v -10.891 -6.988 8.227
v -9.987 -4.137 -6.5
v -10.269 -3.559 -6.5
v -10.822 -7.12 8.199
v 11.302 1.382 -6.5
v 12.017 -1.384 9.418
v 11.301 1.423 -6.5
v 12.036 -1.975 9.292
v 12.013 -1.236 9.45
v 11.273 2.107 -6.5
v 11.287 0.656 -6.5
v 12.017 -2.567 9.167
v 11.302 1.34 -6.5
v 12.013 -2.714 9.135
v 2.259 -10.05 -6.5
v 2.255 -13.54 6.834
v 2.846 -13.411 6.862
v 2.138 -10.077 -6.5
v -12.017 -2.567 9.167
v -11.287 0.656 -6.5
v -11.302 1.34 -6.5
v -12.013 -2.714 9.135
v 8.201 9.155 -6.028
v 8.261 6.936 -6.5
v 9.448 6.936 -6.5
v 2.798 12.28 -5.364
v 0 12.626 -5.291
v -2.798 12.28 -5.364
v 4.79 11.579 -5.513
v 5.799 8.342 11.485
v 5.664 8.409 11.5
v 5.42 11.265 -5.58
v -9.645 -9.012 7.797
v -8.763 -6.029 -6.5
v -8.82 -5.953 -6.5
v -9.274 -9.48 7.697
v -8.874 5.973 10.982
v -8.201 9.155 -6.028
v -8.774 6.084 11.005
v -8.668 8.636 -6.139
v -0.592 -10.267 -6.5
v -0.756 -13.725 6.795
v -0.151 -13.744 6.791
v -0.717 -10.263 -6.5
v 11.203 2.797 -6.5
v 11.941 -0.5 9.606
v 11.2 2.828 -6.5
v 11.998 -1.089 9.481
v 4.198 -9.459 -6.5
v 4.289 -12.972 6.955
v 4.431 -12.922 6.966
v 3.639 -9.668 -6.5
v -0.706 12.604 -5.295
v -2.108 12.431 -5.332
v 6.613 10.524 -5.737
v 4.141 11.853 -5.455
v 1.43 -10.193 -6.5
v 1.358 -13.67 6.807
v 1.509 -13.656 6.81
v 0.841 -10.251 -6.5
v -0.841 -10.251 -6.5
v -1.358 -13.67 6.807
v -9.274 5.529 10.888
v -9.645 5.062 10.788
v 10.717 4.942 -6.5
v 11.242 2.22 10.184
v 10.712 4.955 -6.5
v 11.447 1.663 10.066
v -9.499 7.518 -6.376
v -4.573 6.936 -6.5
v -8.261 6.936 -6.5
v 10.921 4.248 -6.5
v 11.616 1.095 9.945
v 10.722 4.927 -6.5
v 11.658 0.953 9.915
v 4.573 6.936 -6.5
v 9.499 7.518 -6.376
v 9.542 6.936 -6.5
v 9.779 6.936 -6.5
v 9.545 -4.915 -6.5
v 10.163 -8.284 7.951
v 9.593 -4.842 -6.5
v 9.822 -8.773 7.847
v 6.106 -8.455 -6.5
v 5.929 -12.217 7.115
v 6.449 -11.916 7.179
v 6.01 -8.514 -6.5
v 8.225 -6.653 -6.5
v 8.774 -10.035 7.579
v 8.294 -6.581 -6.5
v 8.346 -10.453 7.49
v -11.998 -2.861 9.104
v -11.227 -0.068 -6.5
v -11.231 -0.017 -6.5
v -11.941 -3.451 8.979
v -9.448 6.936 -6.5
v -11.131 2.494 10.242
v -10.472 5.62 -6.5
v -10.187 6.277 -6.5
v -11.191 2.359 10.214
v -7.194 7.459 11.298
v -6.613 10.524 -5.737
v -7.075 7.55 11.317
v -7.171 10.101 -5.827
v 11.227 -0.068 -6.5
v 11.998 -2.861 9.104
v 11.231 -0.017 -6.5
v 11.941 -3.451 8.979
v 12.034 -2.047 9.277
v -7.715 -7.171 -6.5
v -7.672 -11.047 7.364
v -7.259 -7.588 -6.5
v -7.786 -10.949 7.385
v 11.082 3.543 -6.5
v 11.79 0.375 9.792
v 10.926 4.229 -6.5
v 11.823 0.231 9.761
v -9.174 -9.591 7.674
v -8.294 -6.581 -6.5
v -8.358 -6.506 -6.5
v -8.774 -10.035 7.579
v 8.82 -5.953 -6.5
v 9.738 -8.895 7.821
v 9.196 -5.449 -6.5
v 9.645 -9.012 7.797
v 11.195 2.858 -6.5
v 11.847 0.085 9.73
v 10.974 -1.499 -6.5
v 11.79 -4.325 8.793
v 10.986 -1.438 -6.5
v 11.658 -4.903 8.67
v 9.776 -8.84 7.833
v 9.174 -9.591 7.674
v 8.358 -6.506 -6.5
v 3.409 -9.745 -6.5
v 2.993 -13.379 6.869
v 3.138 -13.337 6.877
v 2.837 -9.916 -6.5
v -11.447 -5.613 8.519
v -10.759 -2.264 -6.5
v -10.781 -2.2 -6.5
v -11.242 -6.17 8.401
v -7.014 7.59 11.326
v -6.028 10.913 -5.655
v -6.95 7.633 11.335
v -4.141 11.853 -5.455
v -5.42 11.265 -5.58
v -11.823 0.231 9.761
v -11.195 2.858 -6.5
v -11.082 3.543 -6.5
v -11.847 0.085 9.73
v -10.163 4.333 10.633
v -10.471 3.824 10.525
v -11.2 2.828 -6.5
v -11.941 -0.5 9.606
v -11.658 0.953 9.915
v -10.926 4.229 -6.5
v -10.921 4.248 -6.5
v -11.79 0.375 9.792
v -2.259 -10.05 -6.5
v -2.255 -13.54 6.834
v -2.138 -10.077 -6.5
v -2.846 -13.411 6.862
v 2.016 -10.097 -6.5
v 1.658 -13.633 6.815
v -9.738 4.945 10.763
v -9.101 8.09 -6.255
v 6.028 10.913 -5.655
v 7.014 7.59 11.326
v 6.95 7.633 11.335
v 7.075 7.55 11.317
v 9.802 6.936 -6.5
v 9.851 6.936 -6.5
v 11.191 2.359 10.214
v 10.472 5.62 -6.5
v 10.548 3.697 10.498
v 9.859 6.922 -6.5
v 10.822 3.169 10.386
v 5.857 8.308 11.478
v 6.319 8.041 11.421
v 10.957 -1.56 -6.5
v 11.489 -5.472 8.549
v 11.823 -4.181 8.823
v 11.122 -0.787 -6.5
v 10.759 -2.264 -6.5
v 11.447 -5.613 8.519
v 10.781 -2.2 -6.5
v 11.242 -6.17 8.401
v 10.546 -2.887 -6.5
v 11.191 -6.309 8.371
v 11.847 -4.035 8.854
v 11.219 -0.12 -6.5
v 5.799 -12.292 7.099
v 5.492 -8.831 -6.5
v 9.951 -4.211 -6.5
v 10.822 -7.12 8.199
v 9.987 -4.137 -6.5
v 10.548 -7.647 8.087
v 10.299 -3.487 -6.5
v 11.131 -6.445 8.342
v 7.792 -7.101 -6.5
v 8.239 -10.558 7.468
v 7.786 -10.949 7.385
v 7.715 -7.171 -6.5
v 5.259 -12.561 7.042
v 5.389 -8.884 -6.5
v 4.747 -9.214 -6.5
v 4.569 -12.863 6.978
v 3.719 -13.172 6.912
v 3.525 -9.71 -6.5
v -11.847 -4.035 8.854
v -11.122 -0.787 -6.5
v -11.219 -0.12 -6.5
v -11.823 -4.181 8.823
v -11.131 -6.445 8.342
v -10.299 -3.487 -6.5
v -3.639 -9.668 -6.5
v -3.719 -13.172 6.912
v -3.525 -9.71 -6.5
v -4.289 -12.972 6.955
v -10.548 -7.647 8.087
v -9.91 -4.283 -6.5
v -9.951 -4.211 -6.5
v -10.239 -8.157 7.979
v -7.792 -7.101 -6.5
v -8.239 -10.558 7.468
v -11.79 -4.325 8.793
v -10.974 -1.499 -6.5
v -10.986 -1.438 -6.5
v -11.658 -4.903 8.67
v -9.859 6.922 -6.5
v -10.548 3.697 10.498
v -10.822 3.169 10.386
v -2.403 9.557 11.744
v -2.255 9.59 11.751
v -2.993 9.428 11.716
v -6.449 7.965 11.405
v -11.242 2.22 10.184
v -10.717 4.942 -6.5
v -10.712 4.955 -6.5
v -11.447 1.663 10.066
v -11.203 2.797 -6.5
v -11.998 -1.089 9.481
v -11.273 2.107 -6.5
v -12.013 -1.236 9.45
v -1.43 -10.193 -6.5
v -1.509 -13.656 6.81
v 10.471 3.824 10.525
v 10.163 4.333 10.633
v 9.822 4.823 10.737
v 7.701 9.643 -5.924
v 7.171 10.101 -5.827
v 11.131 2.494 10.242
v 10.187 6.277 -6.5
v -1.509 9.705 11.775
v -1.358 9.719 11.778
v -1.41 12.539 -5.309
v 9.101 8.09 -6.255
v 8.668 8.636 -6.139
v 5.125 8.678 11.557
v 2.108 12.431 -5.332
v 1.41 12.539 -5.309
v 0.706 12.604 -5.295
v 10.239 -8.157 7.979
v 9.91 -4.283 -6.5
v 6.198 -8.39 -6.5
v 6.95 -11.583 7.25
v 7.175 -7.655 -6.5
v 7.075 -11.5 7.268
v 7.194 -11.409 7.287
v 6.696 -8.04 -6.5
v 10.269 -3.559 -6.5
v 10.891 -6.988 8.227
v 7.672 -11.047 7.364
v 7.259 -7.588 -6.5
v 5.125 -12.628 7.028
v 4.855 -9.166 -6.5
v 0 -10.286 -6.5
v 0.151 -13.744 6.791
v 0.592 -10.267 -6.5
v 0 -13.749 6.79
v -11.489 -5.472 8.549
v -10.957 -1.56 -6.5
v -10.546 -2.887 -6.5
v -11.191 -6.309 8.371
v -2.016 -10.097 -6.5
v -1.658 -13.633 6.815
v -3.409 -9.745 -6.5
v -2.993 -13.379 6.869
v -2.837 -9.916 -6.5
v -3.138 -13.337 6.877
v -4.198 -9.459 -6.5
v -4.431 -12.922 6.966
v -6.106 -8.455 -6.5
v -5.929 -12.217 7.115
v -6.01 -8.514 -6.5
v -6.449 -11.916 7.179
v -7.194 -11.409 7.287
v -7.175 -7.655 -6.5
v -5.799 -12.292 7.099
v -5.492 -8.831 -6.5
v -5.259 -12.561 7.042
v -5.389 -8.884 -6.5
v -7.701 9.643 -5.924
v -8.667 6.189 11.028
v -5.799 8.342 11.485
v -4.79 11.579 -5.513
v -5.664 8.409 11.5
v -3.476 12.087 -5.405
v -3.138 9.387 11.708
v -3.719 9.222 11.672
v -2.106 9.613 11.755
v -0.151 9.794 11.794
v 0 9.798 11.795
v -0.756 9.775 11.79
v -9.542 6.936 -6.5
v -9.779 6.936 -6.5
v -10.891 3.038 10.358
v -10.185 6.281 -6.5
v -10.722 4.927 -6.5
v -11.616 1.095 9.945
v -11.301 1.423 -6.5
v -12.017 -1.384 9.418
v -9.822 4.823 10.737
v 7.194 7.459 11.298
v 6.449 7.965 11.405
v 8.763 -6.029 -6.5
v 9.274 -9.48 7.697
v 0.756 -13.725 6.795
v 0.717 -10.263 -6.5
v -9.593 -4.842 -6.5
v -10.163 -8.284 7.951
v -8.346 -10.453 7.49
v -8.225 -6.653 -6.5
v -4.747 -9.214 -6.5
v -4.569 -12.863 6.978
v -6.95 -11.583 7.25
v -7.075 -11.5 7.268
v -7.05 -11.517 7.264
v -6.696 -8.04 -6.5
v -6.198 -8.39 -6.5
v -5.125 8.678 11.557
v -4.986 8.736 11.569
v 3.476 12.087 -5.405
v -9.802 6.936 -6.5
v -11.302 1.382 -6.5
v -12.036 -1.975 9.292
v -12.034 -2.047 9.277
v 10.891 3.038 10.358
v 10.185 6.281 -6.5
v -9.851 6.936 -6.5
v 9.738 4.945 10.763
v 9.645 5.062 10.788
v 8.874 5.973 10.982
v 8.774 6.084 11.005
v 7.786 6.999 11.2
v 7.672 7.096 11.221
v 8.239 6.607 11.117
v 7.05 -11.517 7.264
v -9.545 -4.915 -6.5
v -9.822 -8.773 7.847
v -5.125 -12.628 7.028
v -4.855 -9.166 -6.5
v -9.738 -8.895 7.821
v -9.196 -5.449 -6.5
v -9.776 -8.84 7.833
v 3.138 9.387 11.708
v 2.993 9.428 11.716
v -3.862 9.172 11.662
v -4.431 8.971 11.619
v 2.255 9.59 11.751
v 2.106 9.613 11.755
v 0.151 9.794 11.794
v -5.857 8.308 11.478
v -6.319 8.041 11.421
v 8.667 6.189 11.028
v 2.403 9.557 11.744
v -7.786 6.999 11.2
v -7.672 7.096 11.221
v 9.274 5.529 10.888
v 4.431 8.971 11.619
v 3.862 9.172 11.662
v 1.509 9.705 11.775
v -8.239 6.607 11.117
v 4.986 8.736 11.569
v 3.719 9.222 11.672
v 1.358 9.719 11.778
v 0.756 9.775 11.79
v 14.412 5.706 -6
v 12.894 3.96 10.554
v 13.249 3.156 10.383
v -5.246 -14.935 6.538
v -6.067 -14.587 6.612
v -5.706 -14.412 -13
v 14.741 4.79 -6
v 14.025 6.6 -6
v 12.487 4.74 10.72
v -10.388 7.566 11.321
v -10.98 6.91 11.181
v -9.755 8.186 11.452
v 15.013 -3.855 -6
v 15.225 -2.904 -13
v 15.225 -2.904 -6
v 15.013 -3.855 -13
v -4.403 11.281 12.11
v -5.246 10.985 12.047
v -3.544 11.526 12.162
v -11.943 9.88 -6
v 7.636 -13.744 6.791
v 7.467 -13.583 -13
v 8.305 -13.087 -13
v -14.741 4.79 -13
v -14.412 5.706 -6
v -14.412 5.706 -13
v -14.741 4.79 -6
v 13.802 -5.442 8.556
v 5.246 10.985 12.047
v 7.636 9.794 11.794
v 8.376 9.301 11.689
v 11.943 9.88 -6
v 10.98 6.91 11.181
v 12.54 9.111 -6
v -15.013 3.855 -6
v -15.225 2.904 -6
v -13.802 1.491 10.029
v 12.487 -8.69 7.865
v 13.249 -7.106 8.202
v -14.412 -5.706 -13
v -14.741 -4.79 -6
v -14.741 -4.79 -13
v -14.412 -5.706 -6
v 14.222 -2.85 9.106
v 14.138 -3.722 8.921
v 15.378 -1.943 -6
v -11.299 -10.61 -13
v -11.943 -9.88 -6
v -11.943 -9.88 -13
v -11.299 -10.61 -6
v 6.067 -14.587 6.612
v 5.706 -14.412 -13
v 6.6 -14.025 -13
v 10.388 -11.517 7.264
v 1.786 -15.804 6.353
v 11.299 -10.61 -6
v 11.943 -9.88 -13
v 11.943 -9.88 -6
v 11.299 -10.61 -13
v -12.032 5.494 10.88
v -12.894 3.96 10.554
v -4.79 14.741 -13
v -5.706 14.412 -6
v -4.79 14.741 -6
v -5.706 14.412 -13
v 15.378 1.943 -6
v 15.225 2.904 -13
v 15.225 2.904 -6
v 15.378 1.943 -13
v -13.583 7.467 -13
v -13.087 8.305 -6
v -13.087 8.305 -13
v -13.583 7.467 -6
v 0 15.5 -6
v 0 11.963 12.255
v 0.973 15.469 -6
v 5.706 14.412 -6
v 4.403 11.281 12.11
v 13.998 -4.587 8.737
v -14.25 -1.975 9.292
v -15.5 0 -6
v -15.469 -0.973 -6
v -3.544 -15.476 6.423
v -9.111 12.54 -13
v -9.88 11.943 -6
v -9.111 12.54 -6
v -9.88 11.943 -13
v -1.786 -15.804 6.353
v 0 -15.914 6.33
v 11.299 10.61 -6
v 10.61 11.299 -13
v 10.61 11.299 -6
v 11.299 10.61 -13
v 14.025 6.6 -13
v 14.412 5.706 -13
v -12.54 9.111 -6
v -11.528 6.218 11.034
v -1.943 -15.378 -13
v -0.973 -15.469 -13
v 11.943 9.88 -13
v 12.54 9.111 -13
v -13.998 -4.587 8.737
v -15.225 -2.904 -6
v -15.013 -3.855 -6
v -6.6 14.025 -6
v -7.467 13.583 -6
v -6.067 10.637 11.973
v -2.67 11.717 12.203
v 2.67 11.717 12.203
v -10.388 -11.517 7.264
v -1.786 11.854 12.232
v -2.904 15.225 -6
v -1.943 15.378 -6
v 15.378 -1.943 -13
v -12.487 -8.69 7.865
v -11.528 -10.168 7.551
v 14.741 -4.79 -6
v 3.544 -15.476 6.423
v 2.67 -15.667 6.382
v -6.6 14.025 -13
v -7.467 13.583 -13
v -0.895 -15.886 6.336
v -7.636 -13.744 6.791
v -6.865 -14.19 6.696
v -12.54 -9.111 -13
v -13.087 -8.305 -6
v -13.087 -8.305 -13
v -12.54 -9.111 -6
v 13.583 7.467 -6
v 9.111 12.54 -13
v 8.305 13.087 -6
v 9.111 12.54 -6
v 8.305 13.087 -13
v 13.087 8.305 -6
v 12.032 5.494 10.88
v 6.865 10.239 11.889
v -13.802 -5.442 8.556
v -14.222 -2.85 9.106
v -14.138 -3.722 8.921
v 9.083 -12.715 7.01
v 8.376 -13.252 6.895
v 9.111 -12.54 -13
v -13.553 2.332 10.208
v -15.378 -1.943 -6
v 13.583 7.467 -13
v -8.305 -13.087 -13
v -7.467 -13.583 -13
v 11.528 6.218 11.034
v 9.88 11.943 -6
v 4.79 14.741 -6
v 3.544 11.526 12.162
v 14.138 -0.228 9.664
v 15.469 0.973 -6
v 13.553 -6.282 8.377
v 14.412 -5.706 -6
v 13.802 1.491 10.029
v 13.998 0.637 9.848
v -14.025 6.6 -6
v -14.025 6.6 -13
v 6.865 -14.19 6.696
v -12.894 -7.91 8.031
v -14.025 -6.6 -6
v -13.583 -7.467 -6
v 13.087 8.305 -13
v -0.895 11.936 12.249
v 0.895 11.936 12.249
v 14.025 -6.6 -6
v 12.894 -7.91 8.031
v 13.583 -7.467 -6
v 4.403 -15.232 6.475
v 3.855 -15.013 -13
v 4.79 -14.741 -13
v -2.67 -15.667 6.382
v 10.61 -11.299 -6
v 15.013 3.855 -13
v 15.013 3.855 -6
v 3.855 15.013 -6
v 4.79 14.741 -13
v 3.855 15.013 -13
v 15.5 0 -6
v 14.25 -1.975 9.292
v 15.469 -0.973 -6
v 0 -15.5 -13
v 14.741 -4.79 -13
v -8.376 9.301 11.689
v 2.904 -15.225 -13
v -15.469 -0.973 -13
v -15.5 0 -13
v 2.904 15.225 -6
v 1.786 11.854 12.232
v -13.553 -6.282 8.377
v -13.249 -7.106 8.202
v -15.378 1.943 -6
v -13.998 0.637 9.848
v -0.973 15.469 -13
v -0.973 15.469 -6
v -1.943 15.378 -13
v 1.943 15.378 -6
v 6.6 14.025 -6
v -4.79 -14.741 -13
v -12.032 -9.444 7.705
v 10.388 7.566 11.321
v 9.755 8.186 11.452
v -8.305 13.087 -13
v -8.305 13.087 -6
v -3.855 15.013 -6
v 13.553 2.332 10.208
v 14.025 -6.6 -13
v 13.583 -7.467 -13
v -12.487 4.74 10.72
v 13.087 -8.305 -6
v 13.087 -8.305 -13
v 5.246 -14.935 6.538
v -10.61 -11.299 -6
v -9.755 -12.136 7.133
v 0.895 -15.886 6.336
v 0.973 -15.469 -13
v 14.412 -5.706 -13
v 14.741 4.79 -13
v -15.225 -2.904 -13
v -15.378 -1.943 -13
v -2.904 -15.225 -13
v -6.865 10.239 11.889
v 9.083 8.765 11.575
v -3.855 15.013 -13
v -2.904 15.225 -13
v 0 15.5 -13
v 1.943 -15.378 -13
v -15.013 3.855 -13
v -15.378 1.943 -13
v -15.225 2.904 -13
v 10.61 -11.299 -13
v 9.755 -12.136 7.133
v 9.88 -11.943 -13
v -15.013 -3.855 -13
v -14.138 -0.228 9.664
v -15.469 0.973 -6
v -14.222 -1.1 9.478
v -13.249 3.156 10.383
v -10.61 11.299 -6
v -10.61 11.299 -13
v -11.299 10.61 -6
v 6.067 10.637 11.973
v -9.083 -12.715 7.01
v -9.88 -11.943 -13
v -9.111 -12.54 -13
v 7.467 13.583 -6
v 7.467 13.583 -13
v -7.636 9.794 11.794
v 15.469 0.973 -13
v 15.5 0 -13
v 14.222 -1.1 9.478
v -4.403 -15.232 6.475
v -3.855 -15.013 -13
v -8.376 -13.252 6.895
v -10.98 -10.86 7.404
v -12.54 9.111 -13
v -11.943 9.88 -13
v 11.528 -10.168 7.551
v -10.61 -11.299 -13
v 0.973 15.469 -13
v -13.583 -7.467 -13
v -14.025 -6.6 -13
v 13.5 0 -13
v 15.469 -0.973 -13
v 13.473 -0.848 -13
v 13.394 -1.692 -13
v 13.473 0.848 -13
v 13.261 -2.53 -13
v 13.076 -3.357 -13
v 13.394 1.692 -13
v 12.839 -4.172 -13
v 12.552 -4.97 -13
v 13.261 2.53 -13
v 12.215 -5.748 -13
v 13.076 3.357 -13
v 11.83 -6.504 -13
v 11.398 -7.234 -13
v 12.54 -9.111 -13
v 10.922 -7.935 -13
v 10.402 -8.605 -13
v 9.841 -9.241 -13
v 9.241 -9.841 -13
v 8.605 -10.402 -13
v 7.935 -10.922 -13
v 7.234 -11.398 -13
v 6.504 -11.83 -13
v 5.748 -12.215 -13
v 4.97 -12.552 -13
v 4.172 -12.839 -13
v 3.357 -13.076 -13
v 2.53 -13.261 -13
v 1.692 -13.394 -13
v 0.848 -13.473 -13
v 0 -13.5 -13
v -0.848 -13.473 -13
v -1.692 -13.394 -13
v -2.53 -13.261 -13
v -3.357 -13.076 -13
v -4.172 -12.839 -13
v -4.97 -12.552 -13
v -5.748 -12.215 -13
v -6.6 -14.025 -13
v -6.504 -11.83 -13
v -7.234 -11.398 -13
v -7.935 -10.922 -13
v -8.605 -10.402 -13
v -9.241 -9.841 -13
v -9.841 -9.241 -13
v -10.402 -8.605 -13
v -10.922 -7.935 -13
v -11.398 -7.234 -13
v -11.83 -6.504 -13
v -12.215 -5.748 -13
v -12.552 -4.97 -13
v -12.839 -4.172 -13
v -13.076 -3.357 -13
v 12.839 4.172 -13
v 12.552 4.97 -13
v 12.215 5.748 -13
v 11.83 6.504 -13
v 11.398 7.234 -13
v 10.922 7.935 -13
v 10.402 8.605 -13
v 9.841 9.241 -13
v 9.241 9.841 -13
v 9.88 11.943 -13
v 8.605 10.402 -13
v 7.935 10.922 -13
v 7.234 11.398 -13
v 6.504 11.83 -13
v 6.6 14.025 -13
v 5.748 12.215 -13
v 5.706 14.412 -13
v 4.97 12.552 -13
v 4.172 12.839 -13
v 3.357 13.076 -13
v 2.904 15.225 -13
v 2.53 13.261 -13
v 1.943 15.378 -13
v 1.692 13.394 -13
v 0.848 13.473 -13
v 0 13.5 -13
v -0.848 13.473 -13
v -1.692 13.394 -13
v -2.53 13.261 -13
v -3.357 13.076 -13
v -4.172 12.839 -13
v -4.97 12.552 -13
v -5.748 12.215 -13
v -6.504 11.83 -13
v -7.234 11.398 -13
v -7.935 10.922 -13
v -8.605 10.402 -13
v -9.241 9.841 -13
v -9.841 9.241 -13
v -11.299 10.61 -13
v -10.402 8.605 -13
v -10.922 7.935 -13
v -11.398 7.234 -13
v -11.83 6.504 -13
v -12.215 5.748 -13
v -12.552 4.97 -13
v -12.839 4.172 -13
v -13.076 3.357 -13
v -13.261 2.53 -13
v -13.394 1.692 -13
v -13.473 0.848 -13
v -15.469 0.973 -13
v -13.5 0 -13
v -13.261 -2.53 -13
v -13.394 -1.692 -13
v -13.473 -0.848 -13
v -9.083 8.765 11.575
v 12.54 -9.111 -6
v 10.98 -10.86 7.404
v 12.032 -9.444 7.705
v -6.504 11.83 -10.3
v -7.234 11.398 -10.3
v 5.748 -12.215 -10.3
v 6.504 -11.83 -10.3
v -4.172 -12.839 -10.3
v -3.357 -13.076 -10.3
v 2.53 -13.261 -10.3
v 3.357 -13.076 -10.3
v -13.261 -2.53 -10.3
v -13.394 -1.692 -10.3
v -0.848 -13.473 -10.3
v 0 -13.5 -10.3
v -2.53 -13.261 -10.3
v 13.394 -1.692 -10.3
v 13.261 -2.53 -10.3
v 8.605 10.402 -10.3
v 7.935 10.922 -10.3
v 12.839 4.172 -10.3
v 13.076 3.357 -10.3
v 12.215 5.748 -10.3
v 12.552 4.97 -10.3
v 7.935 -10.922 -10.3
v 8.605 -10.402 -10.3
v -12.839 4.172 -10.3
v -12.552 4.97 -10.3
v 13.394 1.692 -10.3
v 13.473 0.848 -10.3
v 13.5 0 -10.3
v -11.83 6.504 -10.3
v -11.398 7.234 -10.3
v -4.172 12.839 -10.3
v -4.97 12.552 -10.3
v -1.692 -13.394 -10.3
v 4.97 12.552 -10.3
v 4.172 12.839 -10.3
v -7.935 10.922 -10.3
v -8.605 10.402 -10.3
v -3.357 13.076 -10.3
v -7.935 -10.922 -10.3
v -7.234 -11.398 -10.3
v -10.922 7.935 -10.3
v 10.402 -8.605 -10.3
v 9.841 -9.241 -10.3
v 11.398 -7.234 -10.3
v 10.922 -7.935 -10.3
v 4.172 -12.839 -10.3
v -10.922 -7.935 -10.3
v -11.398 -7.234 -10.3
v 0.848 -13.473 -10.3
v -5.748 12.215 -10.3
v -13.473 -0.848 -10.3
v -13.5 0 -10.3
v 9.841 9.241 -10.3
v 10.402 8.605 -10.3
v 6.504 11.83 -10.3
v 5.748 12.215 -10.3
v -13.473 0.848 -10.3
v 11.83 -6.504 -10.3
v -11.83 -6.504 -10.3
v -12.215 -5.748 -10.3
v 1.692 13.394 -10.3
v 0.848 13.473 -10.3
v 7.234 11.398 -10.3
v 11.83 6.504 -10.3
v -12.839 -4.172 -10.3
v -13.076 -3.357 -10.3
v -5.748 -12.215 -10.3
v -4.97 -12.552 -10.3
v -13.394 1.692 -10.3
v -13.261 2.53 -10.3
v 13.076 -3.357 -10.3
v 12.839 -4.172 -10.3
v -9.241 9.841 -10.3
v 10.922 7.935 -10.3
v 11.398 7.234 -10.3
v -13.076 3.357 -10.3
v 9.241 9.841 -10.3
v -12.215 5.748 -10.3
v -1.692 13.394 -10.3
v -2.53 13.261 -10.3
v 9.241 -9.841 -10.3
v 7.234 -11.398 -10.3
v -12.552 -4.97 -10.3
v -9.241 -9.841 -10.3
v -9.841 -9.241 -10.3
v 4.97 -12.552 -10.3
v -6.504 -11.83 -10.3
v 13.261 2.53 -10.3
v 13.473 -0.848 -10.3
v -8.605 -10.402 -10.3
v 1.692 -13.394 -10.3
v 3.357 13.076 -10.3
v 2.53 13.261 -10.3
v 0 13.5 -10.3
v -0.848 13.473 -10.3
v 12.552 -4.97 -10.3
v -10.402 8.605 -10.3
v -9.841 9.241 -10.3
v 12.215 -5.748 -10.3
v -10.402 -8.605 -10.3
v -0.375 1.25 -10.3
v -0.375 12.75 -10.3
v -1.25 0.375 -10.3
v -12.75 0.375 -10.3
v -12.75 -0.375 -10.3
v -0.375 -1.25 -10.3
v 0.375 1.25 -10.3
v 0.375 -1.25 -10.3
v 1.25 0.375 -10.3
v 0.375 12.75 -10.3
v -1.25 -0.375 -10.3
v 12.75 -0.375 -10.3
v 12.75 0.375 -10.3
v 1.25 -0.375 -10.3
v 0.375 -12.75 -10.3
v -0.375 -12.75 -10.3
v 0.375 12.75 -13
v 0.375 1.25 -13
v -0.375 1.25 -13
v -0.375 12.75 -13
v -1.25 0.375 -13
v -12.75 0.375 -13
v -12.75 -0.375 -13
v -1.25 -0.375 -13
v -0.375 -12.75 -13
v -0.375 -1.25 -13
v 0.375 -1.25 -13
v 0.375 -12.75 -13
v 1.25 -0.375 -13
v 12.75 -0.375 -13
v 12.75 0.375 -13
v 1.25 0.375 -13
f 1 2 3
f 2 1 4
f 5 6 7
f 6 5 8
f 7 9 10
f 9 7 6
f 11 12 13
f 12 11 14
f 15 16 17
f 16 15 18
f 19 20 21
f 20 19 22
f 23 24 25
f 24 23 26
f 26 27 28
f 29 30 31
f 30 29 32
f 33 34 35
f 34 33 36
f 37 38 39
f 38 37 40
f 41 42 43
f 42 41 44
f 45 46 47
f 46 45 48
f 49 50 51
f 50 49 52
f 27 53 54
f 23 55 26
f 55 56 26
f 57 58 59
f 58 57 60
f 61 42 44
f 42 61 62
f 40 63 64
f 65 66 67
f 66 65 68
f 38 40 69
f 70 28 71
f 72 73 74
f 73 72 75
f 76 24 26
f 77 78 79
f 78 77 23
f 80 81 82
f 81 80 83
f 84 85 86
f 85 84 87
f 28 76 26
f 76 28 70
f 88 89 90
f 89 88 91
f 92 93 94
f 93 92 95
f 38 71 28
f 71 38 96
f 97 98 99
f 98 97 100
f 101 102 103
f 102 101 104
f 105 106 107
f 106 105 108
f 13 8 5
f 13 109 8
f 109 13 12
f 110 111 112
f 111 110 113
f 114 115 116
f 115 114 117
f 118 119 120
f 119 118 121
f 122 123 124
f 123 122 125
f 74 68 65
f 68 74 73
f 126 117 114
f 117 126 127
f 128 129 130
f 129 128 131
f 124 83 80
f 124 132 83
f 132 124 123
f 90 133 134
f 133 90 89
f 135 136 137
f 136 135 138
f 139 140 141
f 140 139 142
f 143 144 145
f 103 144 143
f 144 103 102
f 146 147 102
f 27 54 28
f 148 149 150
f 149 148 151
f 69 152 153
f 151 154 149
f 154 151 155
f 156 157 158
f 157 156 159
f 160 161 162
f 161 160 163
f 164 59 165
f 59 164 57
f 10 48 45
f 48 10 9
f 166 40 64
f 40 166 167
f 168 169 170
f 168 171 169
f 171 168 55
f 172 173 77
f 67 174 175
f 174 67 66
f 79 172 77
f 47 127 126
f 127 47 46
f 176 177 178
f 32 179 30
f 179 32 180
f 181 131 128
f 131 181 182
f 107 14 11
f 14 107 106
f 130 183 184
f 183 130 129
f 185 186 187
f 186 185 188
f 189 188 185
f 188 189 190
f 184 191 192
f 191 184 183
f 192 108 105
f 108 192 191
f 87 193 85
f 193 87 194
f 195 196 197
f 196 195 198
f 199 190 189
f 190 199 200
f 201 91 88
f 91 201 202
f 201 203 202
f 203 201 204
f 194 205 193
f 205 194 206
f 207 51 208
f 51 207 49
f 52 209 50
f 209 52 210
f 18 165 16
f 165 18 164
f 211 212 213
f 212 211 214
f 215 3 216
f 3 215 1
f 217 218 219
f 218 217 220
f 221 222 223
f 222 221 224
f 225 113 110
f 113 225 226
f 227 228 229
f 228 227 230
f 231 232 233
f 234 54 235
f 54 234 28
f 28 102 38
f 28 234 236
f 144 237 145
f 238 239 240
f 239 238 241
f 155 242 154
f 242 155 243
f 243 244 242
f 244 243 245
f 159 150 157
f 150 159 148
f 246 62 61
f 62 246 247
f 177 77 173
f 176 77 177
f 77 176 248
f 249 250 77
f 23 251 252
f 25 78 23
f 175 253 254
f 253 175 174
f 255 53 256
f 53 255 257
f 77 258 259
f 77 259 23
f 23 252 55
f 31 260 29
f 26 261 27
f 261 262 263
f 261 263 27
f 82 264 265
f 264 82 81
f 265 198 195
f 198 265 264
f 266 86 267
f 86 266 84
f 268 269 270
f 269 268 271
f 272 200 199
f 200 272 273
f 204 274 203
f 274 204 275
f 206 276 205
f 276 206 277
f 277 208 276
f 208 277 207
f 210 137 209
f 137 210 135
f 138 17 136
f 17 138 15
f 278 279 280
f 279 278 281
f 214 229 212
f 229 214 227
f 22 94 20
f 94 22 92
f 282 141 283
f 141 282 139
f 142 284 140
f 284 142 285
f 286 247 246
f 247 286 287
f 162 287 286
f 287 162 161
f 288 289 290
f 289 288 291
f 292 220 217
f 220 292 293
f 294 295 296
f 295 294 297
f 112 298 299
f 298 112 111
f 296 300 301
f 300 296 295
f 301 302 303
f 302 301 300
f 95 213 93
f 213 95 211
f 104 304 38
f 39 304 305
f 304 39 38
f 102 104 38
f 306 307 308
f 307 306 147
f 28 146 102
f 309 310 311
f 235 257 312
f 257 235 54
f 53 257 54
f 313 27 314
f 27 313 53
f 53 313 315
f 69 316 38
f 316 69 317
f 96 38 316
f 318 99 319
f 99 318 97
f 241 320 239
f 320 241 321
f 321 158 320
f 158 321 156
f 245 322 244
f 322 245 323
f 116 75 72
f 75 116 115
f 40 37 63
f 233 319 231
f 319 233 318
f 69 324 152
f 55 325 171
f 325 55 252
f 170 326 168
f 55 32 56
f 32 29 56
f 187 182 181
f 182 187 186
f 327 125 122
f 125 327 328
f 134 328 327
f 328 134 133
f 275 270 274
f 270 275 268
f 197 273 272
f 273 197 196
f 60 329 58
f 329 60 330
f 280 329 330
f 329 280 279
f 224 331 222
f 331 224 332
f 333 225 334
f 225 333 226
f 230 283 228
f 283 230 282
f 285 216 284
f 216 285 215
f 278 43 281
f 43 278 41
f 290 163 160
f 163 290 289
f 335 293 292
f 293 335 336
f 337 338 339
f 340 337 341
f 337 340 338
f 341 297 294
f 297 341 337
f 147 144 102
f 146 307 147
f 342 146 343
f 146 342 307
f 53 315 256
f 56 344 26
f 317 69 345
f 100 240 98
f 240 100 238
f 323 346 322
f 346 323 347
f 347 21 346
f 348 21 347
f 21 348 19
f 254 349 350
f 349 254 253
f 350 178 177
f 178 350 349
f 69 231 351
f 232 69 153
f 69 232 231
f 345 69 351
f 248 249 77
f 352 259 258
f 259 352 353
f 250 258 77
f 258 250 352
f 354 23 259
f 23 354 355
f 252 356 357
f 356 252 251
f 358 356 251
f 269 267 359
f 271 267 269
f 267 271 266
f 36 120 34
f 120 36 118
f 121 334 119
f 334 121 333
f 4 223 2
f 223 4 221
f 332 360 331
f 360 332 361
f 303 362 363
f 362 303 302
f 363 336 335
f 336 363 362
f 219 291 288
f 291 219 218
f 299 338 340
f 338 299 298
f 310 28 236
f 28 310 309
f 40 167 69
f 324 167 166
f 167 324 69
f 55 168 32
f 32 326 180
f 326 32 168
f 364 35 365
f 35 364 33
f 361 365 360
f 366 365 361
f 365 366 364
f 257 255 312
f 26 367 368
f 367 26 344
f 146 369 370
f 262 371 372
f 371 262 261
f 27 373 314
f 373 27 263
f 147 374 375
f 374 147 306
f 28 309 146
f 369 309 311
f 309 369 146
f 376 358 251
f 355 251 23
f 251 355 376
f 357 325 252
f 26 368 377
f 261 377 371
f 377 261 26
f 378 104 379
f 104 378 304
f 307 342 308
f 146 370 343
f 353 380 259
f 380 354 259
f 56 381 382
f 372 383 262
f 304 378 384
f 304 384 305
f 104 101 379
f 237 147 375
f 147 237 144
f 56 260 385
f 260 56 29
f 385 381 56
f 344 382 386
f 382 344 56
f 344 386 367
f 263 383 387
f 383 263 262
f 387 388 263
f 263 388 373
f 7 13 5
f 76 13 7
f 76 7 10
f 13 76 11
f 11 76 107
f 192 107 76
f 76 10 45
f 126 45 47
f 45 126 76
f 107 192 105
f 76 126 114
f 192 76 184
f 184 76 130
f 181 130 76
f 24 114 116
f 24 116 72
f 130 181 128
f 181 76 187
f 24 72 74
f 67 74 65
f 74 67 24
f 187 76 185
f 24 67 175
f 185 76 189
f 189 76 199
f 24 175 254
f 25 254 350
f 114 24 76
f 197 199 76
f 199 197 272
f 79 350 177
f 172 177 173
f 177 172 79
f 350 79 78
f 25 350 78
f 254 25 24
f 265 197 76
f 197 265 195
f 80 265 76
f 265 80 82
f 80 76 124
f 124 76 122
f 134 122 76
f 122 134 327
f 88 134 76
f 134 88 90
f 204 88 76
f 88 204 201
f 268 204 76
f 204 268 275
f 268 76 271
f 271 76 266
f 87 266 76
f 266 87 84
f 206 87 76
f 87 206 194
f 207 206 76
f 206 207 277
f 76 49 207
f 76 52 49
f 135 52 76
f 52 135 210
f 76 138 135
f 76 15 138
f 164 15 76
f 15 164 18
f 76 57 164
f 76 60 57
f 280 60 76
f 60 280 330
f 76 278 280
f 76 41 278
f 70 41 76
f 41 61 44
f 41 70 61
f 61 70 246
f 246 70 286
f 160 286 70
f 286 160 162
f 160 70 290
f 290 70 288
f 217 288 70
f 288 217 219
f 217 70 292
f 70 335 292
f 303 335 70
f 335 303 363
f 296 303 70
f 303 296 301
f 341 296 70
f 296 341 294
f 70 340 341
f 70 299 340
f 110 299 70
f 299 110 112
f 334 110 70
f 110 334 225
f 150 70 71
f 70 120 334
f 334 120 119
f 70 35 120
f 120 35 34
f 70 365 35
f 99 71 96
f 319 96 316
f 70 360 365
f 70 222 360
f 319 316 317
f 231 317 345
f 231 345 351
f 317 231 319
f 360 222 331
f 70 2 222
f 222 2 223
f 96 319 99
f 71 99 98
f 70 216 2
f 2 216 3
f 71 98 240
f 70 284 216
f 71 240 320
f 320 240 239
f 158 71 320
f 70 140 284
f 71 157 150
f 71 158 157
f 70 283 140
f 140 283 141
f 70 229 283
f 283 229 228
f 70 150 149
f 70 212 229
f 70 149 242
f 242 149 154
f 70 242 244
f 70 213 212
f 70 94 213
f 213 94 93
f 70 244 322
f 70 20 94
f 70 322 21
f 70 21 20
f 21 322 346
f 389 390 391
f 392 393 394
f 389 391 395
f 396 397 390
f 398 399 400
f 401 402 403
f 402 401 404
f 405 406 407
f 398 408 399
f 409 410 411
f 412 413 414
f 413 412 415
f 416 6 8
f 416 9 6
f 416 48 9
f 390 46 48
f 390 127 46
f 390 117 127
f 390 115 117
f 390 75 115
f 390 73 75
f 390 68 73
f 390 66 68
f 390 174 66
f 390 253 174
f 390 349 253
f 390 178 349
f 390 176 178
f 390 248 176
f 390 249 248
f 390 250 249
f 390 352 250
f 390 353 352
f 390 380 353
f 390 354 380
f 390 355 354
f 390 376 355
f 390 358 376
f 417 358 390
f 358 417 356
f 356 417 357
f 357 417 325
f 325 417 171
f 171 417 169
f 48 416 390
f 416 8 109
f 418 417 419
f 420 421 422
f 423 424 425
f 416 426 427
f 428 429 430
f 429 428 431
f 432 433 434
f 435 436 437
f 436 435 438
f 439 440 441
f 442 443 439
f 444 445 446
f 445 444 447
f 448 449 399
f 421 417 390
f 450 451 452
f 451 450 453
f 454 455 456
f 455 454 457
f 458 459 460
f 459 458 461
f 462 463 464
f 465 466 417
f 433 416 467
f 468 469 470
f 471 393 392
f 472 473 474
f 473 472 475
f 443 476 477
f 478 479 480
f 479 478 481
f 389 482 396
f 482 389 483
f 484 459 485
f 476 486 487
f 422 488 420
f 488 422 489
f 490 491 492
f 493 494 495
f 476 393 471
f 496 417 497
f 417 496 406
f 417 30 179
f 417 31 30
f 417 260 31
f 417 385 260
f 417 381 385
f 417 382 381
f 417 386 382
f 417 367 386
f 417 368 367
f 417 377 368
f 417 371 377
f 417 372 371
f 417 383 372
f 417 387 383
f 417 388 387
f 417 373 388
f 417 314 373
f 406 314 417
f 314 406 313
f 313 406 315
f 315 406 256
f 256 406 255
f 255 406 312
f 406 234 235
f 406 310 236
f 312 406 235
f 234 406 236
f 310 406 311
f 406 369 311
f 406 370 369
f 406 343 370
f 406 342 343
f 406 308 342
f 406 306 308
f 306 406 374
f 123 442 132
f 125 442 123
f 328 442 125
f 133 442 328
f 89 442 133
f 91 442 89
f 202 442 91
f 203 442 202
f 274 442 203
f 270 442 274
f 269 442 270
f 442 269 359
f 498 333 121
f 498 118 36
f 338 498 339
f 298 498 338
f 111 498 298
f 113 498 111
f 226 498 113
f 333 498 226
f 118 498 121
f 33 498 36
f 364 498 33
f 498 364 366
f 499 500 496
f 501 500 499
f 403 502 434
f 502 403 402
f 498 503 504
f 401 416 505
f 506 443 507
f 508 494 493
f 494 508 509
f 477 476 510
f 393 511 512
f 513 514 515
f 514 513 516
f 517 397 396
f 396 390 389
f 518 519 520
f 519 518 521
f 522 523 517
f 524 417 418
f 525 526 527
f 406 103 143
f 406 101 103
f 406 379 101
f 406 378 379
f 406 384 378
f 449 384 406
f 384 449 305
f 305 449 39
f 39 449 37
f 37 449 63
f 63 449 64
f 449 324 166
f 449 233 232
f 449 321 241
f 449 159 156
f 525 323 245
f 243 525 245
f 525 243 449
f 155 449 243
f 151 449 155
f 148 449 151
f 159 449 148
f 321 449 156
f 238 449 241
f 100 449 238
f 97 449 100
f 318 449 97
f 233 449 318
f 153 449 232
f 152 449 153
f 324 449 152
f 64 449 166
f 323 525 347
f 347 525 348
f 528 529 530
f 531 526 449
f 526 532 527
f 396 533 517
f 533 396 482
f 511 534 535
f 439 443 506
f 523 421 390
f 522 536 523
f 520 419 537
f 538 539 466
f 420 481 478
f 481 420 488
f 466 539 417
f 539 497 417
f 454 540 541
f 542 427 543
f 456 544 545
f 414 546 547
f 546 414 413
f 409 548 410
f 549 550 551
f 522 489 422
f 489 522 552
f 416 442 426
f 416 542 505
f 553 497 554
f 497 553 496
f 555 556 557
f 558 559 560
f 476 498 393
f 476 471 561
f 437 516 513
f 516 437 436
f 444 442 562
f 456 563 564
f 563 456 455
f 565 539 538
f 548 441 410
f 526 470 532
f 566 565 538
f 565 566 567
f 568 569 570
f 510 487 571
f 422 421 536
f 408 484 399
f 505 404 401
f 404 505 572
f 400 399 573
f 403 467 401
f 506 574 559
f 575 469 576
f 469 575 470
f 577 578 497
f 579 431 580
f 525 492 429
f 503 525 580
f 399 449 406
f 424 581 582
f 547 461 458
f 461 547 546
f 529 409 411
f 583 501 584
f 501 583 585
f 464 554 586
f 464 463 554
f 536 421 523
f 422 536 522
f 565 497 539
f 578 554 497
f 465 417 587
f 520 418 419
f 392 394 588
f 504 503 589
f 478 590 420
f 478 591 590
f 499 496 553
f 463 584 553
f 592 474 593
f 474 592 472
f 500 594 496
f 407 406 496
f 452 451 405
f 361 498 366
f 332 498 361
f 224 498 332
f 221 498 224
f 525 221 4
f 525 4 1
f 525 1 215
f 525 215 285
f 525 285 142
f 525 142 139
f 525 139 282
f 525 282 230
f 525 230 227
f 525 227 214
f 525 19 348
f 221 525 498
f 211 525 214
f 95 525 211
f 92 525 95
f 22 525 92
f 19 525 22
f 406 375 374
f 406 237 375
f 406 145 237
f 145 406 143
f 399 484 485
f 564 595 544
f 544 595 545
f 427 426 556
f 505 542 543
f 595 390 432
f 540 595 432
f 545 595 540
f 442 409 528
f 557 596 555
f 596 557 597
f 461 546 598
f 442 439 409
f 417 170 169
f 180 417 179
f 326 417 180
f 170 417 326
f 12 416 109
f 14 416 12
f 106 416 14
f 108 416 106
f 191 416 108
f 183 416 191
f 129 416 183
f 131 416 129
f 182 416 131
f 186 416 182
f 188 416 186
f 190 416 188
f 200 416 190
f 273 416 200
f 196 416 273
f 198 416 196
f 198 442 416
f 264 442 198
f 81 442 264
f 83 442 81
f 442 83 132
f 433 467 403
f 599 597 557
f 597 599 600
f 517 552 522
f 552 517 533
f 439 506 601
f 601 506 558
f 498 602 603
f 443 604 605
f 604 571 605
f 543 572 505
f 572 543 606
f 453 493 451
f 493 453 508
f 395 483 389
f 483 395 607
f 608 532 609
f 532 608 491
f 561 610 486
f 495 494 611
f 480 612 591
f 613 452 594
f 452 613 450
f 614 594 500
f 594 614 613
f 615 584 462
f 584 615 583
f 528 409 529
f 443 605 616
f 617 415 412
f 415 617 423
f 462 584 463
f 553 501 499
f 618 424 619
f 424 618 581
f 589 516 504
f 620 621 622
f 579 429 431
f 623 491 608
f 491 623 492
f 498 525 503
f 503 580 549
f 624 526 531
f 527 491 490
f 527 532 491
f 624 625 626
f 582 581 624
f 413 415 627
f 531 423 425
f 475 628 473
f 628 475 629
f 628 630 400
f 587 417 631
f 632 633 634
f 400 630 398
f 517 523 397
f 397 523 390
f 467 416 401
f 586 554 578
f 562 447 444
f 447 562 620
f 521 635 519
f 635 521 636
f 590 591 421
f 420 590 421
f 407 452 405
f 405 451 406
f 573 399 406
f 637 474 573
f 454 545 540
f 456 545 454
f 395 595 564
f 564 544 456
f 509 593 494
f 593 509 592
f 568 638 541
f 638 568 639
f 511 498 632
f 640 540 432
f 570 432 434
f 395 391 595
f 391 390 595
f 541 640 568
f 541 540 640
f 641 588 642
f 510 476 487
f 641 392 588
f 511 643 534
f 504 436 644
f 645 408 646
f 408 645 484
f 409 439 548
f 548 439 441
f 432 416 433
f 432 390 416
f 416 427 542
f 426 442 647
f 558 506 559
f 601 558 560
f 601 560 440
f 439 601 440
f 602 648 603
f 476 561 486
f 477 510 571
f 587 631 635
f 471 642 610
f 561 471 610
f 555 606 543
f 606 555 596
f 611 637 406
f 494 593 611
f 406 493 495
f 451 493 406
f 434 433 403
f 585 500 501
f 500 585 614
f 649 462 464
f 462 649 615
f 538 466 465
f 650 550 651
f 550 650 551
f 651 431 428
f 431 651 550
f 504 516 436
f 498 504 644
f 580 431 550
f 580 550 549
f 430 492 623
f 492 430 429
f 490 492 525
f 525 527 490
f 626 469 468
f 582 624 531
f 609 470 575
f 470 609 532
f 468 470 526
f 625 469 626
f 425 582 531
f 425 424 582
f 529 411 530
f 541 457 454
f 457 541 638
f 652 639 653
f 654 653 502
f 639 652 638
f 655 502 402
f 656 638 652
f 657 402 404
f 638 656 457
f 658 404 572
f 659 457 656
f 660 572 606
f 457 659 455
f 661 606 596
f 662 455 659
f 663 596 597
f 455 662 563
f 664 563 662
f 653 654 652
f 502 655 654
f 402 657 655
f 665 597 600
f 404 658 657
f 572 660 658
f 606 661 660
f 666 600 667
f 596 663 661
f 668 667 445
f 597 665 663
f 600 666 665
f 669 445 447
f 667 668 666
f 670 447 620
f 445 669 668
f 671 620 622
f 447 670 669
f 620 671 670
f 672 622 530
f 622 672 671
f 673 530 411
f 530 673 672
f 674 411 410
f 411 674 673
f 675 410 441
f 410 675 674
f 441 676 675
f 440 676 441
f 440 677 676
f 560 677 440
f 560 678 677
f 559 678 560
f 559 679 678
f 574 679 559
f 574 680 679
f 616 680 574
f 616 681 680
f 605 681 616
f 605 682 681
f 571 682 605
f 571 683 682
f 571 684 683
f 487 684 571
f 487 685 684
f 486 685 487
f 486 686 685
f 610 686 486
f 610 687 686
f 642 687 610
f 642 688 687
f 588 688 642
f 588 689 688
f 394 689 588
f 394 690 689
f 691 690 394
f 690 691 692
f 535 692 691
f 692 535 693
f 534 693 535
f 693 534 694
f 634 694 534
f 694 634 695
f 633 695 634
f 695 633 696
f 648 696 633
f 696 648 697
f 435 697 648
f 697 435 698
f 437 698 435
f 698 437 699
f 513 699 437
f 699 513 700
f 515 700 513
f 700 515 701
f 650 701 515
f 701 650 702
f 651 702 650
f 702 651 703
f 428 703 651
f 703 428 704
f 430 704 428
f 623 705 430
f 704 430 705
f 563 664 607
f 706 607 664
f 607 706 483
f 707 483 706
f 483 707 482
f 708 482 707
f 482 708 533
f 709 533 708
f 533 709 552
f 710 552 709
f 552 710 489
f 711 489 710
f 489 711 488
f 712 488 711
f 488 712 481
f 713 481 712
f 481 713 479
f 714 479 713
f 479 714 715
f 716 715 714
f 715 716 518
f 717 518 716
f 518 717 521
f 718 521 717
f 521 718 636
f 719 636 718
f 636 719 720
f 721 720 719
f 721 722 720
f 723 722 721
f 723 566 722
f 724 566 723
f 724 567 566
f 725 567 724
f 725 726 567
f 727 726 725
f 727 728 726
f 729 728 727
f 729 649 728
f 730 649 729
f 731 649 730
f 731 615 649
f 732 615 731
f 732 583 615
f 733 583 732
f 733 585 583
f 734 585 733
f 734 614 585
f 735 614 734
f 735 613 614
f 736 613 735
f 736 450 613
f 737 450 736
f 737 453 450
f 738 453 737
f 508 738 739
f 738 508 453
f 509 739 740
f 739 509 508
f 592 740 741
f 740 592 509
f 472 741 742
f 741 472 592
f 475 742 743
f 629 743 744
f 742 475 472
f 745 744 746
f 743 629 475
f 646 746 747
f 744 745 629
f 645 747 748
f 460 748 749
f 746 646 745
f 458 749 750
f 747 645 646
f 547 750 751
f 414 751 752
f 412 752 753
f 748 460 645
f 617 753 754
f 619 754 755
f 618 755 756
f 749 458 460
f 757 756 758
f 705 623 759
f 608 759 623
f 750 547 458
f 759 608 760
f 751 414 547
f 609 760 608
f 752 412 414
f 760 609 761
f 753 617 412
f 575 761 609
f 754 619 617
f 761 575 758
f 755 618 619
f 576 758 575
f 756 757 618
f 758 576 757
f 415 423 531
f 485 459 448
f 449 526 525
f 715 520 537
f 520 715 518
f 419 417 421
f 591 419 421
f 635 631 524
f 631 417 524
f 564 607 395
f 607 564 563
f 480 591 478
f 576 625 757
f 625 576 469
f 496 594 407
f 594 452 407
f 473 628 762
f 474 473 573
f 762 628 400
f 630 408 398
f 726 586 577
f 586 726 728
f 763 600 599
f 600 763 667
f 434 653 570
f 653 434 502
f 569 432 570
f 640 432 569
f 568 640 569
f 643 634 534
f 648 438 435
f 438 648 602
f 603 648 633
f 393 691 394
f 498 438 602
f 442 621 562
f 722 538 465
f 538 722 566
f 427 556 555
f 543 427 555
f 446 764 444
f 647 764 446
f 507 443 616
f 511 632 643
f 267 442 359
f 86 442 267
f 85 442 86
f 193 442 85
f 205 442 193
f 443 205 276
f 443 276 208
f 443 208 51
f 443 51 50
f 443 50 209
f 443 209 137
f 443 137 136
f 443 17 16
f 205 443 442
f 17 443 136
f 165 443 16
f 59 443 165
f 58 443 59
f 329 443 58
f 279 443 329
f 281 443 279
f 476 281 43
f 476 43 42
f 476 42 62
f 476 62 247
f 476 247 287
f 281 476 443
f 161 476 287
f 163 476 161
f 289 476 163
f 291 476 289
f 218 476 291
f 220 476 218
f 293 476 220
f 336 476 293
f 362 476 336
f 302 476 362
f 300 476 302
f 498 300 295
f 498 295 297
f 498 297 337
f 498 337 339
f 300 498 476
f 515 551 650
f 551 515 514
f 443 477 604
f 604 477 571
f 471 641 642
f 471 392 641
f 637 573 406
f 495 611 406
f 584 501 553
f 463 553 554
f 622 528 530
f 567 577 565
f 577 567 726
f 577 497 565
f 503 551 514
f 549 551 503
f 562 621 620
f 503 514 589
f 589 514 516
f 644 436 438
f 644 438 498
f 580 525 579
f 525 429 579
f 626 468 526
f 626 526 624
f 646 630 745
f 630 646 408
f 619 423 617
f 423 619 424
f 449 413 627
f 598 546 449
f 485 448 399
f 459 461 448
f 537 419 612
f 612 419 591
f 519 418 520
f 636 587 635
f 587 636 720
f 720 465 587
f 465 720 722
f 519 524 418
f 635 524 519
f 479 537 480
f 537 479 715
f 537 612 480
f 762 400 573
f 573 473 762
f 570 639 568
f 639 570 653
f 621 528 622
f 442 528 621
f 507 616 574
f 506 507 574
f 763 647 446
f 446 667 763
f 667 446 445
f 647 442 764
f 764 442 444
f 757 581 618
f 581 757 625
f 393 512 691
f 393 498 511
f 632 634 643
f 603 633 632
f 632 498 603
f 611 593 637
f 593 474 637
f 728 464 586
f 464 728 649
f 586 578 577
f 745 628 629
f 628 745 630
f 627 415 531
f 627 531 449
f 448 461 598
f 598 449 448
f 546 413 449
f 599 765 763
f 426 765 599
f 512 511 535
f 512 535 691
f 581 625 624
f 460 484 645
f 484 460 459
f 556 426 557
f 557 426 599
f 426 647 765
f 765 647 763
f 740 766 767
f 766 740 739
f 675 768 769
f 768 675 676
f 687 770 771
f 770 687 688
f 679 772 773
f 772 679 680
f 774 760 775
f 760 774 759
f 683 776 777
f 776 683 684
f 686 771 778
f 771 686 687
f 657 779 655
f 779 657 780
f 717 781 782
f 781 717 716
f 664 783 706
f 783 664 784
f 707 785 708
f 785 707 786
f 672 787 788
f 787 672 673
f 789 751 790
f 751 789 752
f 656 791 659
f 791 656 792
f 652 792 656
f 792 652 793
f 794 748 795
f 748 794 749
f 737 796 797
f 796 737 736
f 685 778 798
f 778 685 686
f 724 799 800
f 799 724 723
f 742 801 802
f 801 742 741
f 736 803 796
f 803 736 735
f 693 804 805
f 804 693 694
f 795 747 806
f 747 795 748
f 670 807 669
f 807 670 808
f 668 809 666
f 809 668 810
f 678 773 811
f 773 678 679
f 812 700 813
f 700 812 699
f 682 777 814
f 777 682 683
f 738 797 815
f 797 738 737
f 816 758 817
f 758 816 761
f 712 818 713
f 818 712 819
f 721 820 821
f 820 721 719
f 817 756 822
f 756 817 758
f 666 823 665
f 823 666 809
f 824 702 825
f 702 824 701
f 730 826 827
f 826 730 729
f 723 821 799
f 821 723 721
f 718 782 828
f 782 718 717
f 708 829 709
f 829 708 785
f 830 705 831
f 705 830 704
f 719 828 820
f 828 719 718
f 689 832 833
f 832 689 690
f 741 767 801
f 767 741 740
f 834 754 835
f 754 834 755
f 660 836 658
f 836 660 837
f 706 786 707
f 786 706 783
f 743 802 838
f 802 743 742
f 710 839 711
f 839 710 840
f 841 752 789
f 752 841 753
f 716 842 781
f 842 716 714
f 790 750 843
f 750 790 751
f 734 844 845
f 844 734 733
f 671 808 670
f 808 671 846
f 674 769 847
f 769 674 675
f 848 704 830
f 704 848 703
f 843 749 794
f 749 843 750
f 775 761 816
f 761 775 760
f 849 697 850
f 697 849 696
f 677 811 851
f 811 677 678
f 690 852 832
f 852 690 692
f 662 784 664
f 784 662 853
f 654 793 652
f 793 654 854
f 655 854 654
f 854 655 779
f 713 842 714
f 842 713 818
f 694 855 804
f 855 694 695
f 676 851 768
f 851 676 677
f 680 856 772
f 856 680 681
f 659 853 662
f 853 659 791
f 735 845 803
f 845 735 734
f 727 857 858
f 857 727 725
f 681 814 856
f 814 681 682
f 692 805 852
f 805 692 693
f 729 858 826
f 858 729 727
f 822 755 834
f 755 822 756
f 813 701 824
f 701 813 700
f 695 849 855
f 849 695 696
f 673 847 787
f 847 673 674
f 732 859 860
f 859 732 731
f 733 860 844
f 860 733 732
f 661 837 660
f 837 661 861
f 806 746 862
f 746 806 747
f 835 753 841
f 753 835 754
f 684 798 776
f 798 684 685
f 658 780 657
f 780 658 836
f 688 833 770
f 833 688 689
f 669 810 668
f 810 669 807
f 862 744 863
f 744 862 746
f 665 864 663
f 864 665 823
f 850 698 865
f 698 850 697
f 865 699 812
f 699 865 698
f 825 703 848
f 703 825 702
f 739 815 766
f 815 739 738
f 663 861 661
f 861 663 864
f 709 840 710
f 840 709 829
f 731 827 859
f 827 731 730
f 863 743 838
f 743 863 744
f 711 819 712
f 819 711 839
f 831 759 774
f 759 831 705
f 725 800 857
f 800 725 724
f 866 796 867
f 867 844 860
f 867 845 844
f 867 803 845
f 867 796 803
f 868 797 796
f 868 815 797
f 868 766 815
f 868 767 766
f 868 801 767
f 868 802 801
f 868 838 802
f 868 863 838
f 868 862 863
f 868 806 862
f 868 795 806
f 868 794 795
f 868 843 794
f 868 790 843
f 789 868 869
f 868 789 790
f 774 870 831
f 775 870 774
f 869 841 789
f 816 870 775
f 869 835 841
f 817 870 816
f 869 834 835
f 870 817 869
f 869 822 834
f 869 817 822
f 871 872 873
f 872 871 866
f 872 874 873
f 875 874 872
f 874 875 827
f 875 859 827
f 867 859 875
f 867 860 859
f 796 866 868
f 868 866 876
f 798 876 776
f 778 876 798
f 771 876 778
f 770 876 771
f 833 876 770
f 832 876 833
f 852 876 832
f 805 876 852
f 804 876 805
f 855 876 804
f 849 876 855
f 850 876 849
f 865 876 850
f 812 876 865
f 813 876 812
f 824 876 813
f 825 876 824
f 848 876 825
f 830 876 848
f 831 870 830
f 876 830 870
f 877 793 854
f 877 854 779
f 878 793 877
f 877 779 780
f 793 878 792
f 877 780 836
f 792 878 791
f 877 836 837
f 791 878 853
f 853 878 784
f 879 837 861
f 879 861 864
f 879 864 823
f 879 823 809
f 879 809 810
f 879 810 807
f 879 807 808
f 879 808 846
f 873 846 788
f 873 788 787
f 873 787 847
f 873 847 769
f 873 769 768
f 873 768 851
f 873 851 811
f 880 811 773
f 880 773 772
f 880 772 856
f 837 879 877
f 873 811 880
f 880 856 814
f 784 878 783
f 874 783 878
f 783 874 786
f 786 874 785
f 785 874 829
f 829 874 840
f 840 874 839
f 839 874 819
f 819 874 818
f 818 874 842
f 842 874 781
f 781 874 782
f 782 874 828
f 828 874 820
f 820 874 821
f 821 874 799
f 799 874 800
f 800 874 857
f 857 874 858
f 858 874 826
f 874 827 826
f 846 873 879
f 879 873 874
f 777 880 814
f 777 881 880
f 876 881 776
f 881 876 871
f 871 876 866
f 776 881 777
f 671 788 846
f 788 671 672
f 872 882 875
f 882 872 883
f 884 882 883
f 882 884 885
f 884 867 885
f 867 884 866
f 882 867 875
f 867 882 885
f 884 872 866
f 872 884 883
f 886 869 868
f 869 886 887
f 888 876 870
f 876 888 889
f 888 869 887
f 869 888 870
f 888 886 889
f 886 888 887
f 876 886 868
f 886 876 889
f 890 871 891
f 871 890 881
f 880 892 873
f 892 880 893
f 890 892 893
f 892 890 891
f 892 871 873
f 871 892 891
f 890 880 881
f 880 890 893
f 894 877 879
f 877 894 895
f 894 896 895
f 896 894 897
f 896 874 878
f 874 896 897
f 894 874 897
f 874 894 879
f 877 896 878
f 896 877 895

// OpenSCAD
// [FL_INDEX: keywords="openscad, 3d_parametric, Chair_Foot_With_Felt_Pad__Customizable, csg_solid" | COT="Parametric OpenSCAD design from 3DCodeverse"]
// Title: Chair Foot With Felt Pad (Customizable)

//
// Kitchen Chair footpad that holds a 1" diameter felt pad
// Keeps the pad from sliding off by providing a small lip
//

Quality = 100; // [25:Draft,100:Production]

// mm
Leg_Bottom_Diameter = 22.5; // [15:50]

// mm
Leg_Top_Diameter = 24.5; // [15:50]

//degrees
Leg_Angle = 12; // [0:20]

// mm
Leg_Cup_Height = 13; // [10:30]

// mm
Felt_Diameter = 27; // [15:52]

// mm
Felt_Height = 5; // [3:10]

// put thin break-away supports under the felt cup
Include_Supports = 1; // [1:Yes,0:No]

// BELOW HERE VARIABLES THAT ARE NOT CUSTOMIZABLE

$fn = Quality;
wall = 2*1;

// Create the thing

union() {
	difference() {
		hull() {
			rotate([Leg_Angle,0,0]) {
				cylinder(r1=Leg_Bottom_Diameter/2+wall, 
						r2=Leg_Top_Diameter/2+wall, 
						h=Leg_Cup_Height+3*wall,
						center=true);
			}
		
			// felt holder
			translate([0,0,-(Leg_Cup_Height+3*wall)/2]) {
				cylinder(r=Felt_Diameter/2 + wall, 
					h=Felt_Height+wall, 
					center=true);
			}
		
		}
	
		// carve out holes for leg and felt
		difference() {
		   rotate([Leg_Angle,0,0])
				translate([0,0,1.6*wall])
					cylinder(r1=Leg_Bottom_Diameter/2, 
						r2=Leg_Top_Diameter/2, 
						h=Leg_Cup_Height+Felt_Height+2*wall,
						center=true);
			translate([0,0,-(5+Leg_Cup_Height+Felt_Height+0*wall)/2])
				cube([200,200,10],center=true);
		}
	
		translate([0,0,-(0.1+Leg_Cup_Height+Felt_Height+3*wall)/2])
			cylinder(r=Felt_Diameter/2, 
				h=Felt_Height/2+1, 
				center=true);
	
	}

	if (Include_Supports) {
		// add in break-away supports under the felt cup, the bridge is
		// a little too far.
	
		for (rot = [0:90:359])
			rotate([0,0,rot])
				translate([0,Felt_Height+wall,-(Leg_Cup_Height+Felt_Height+3*wall-Felt_Height/2+1)/2])
					cube([0.75, Felt_Diameter/2-wall, Felt_Height/2+1], center=true);
	}

}
